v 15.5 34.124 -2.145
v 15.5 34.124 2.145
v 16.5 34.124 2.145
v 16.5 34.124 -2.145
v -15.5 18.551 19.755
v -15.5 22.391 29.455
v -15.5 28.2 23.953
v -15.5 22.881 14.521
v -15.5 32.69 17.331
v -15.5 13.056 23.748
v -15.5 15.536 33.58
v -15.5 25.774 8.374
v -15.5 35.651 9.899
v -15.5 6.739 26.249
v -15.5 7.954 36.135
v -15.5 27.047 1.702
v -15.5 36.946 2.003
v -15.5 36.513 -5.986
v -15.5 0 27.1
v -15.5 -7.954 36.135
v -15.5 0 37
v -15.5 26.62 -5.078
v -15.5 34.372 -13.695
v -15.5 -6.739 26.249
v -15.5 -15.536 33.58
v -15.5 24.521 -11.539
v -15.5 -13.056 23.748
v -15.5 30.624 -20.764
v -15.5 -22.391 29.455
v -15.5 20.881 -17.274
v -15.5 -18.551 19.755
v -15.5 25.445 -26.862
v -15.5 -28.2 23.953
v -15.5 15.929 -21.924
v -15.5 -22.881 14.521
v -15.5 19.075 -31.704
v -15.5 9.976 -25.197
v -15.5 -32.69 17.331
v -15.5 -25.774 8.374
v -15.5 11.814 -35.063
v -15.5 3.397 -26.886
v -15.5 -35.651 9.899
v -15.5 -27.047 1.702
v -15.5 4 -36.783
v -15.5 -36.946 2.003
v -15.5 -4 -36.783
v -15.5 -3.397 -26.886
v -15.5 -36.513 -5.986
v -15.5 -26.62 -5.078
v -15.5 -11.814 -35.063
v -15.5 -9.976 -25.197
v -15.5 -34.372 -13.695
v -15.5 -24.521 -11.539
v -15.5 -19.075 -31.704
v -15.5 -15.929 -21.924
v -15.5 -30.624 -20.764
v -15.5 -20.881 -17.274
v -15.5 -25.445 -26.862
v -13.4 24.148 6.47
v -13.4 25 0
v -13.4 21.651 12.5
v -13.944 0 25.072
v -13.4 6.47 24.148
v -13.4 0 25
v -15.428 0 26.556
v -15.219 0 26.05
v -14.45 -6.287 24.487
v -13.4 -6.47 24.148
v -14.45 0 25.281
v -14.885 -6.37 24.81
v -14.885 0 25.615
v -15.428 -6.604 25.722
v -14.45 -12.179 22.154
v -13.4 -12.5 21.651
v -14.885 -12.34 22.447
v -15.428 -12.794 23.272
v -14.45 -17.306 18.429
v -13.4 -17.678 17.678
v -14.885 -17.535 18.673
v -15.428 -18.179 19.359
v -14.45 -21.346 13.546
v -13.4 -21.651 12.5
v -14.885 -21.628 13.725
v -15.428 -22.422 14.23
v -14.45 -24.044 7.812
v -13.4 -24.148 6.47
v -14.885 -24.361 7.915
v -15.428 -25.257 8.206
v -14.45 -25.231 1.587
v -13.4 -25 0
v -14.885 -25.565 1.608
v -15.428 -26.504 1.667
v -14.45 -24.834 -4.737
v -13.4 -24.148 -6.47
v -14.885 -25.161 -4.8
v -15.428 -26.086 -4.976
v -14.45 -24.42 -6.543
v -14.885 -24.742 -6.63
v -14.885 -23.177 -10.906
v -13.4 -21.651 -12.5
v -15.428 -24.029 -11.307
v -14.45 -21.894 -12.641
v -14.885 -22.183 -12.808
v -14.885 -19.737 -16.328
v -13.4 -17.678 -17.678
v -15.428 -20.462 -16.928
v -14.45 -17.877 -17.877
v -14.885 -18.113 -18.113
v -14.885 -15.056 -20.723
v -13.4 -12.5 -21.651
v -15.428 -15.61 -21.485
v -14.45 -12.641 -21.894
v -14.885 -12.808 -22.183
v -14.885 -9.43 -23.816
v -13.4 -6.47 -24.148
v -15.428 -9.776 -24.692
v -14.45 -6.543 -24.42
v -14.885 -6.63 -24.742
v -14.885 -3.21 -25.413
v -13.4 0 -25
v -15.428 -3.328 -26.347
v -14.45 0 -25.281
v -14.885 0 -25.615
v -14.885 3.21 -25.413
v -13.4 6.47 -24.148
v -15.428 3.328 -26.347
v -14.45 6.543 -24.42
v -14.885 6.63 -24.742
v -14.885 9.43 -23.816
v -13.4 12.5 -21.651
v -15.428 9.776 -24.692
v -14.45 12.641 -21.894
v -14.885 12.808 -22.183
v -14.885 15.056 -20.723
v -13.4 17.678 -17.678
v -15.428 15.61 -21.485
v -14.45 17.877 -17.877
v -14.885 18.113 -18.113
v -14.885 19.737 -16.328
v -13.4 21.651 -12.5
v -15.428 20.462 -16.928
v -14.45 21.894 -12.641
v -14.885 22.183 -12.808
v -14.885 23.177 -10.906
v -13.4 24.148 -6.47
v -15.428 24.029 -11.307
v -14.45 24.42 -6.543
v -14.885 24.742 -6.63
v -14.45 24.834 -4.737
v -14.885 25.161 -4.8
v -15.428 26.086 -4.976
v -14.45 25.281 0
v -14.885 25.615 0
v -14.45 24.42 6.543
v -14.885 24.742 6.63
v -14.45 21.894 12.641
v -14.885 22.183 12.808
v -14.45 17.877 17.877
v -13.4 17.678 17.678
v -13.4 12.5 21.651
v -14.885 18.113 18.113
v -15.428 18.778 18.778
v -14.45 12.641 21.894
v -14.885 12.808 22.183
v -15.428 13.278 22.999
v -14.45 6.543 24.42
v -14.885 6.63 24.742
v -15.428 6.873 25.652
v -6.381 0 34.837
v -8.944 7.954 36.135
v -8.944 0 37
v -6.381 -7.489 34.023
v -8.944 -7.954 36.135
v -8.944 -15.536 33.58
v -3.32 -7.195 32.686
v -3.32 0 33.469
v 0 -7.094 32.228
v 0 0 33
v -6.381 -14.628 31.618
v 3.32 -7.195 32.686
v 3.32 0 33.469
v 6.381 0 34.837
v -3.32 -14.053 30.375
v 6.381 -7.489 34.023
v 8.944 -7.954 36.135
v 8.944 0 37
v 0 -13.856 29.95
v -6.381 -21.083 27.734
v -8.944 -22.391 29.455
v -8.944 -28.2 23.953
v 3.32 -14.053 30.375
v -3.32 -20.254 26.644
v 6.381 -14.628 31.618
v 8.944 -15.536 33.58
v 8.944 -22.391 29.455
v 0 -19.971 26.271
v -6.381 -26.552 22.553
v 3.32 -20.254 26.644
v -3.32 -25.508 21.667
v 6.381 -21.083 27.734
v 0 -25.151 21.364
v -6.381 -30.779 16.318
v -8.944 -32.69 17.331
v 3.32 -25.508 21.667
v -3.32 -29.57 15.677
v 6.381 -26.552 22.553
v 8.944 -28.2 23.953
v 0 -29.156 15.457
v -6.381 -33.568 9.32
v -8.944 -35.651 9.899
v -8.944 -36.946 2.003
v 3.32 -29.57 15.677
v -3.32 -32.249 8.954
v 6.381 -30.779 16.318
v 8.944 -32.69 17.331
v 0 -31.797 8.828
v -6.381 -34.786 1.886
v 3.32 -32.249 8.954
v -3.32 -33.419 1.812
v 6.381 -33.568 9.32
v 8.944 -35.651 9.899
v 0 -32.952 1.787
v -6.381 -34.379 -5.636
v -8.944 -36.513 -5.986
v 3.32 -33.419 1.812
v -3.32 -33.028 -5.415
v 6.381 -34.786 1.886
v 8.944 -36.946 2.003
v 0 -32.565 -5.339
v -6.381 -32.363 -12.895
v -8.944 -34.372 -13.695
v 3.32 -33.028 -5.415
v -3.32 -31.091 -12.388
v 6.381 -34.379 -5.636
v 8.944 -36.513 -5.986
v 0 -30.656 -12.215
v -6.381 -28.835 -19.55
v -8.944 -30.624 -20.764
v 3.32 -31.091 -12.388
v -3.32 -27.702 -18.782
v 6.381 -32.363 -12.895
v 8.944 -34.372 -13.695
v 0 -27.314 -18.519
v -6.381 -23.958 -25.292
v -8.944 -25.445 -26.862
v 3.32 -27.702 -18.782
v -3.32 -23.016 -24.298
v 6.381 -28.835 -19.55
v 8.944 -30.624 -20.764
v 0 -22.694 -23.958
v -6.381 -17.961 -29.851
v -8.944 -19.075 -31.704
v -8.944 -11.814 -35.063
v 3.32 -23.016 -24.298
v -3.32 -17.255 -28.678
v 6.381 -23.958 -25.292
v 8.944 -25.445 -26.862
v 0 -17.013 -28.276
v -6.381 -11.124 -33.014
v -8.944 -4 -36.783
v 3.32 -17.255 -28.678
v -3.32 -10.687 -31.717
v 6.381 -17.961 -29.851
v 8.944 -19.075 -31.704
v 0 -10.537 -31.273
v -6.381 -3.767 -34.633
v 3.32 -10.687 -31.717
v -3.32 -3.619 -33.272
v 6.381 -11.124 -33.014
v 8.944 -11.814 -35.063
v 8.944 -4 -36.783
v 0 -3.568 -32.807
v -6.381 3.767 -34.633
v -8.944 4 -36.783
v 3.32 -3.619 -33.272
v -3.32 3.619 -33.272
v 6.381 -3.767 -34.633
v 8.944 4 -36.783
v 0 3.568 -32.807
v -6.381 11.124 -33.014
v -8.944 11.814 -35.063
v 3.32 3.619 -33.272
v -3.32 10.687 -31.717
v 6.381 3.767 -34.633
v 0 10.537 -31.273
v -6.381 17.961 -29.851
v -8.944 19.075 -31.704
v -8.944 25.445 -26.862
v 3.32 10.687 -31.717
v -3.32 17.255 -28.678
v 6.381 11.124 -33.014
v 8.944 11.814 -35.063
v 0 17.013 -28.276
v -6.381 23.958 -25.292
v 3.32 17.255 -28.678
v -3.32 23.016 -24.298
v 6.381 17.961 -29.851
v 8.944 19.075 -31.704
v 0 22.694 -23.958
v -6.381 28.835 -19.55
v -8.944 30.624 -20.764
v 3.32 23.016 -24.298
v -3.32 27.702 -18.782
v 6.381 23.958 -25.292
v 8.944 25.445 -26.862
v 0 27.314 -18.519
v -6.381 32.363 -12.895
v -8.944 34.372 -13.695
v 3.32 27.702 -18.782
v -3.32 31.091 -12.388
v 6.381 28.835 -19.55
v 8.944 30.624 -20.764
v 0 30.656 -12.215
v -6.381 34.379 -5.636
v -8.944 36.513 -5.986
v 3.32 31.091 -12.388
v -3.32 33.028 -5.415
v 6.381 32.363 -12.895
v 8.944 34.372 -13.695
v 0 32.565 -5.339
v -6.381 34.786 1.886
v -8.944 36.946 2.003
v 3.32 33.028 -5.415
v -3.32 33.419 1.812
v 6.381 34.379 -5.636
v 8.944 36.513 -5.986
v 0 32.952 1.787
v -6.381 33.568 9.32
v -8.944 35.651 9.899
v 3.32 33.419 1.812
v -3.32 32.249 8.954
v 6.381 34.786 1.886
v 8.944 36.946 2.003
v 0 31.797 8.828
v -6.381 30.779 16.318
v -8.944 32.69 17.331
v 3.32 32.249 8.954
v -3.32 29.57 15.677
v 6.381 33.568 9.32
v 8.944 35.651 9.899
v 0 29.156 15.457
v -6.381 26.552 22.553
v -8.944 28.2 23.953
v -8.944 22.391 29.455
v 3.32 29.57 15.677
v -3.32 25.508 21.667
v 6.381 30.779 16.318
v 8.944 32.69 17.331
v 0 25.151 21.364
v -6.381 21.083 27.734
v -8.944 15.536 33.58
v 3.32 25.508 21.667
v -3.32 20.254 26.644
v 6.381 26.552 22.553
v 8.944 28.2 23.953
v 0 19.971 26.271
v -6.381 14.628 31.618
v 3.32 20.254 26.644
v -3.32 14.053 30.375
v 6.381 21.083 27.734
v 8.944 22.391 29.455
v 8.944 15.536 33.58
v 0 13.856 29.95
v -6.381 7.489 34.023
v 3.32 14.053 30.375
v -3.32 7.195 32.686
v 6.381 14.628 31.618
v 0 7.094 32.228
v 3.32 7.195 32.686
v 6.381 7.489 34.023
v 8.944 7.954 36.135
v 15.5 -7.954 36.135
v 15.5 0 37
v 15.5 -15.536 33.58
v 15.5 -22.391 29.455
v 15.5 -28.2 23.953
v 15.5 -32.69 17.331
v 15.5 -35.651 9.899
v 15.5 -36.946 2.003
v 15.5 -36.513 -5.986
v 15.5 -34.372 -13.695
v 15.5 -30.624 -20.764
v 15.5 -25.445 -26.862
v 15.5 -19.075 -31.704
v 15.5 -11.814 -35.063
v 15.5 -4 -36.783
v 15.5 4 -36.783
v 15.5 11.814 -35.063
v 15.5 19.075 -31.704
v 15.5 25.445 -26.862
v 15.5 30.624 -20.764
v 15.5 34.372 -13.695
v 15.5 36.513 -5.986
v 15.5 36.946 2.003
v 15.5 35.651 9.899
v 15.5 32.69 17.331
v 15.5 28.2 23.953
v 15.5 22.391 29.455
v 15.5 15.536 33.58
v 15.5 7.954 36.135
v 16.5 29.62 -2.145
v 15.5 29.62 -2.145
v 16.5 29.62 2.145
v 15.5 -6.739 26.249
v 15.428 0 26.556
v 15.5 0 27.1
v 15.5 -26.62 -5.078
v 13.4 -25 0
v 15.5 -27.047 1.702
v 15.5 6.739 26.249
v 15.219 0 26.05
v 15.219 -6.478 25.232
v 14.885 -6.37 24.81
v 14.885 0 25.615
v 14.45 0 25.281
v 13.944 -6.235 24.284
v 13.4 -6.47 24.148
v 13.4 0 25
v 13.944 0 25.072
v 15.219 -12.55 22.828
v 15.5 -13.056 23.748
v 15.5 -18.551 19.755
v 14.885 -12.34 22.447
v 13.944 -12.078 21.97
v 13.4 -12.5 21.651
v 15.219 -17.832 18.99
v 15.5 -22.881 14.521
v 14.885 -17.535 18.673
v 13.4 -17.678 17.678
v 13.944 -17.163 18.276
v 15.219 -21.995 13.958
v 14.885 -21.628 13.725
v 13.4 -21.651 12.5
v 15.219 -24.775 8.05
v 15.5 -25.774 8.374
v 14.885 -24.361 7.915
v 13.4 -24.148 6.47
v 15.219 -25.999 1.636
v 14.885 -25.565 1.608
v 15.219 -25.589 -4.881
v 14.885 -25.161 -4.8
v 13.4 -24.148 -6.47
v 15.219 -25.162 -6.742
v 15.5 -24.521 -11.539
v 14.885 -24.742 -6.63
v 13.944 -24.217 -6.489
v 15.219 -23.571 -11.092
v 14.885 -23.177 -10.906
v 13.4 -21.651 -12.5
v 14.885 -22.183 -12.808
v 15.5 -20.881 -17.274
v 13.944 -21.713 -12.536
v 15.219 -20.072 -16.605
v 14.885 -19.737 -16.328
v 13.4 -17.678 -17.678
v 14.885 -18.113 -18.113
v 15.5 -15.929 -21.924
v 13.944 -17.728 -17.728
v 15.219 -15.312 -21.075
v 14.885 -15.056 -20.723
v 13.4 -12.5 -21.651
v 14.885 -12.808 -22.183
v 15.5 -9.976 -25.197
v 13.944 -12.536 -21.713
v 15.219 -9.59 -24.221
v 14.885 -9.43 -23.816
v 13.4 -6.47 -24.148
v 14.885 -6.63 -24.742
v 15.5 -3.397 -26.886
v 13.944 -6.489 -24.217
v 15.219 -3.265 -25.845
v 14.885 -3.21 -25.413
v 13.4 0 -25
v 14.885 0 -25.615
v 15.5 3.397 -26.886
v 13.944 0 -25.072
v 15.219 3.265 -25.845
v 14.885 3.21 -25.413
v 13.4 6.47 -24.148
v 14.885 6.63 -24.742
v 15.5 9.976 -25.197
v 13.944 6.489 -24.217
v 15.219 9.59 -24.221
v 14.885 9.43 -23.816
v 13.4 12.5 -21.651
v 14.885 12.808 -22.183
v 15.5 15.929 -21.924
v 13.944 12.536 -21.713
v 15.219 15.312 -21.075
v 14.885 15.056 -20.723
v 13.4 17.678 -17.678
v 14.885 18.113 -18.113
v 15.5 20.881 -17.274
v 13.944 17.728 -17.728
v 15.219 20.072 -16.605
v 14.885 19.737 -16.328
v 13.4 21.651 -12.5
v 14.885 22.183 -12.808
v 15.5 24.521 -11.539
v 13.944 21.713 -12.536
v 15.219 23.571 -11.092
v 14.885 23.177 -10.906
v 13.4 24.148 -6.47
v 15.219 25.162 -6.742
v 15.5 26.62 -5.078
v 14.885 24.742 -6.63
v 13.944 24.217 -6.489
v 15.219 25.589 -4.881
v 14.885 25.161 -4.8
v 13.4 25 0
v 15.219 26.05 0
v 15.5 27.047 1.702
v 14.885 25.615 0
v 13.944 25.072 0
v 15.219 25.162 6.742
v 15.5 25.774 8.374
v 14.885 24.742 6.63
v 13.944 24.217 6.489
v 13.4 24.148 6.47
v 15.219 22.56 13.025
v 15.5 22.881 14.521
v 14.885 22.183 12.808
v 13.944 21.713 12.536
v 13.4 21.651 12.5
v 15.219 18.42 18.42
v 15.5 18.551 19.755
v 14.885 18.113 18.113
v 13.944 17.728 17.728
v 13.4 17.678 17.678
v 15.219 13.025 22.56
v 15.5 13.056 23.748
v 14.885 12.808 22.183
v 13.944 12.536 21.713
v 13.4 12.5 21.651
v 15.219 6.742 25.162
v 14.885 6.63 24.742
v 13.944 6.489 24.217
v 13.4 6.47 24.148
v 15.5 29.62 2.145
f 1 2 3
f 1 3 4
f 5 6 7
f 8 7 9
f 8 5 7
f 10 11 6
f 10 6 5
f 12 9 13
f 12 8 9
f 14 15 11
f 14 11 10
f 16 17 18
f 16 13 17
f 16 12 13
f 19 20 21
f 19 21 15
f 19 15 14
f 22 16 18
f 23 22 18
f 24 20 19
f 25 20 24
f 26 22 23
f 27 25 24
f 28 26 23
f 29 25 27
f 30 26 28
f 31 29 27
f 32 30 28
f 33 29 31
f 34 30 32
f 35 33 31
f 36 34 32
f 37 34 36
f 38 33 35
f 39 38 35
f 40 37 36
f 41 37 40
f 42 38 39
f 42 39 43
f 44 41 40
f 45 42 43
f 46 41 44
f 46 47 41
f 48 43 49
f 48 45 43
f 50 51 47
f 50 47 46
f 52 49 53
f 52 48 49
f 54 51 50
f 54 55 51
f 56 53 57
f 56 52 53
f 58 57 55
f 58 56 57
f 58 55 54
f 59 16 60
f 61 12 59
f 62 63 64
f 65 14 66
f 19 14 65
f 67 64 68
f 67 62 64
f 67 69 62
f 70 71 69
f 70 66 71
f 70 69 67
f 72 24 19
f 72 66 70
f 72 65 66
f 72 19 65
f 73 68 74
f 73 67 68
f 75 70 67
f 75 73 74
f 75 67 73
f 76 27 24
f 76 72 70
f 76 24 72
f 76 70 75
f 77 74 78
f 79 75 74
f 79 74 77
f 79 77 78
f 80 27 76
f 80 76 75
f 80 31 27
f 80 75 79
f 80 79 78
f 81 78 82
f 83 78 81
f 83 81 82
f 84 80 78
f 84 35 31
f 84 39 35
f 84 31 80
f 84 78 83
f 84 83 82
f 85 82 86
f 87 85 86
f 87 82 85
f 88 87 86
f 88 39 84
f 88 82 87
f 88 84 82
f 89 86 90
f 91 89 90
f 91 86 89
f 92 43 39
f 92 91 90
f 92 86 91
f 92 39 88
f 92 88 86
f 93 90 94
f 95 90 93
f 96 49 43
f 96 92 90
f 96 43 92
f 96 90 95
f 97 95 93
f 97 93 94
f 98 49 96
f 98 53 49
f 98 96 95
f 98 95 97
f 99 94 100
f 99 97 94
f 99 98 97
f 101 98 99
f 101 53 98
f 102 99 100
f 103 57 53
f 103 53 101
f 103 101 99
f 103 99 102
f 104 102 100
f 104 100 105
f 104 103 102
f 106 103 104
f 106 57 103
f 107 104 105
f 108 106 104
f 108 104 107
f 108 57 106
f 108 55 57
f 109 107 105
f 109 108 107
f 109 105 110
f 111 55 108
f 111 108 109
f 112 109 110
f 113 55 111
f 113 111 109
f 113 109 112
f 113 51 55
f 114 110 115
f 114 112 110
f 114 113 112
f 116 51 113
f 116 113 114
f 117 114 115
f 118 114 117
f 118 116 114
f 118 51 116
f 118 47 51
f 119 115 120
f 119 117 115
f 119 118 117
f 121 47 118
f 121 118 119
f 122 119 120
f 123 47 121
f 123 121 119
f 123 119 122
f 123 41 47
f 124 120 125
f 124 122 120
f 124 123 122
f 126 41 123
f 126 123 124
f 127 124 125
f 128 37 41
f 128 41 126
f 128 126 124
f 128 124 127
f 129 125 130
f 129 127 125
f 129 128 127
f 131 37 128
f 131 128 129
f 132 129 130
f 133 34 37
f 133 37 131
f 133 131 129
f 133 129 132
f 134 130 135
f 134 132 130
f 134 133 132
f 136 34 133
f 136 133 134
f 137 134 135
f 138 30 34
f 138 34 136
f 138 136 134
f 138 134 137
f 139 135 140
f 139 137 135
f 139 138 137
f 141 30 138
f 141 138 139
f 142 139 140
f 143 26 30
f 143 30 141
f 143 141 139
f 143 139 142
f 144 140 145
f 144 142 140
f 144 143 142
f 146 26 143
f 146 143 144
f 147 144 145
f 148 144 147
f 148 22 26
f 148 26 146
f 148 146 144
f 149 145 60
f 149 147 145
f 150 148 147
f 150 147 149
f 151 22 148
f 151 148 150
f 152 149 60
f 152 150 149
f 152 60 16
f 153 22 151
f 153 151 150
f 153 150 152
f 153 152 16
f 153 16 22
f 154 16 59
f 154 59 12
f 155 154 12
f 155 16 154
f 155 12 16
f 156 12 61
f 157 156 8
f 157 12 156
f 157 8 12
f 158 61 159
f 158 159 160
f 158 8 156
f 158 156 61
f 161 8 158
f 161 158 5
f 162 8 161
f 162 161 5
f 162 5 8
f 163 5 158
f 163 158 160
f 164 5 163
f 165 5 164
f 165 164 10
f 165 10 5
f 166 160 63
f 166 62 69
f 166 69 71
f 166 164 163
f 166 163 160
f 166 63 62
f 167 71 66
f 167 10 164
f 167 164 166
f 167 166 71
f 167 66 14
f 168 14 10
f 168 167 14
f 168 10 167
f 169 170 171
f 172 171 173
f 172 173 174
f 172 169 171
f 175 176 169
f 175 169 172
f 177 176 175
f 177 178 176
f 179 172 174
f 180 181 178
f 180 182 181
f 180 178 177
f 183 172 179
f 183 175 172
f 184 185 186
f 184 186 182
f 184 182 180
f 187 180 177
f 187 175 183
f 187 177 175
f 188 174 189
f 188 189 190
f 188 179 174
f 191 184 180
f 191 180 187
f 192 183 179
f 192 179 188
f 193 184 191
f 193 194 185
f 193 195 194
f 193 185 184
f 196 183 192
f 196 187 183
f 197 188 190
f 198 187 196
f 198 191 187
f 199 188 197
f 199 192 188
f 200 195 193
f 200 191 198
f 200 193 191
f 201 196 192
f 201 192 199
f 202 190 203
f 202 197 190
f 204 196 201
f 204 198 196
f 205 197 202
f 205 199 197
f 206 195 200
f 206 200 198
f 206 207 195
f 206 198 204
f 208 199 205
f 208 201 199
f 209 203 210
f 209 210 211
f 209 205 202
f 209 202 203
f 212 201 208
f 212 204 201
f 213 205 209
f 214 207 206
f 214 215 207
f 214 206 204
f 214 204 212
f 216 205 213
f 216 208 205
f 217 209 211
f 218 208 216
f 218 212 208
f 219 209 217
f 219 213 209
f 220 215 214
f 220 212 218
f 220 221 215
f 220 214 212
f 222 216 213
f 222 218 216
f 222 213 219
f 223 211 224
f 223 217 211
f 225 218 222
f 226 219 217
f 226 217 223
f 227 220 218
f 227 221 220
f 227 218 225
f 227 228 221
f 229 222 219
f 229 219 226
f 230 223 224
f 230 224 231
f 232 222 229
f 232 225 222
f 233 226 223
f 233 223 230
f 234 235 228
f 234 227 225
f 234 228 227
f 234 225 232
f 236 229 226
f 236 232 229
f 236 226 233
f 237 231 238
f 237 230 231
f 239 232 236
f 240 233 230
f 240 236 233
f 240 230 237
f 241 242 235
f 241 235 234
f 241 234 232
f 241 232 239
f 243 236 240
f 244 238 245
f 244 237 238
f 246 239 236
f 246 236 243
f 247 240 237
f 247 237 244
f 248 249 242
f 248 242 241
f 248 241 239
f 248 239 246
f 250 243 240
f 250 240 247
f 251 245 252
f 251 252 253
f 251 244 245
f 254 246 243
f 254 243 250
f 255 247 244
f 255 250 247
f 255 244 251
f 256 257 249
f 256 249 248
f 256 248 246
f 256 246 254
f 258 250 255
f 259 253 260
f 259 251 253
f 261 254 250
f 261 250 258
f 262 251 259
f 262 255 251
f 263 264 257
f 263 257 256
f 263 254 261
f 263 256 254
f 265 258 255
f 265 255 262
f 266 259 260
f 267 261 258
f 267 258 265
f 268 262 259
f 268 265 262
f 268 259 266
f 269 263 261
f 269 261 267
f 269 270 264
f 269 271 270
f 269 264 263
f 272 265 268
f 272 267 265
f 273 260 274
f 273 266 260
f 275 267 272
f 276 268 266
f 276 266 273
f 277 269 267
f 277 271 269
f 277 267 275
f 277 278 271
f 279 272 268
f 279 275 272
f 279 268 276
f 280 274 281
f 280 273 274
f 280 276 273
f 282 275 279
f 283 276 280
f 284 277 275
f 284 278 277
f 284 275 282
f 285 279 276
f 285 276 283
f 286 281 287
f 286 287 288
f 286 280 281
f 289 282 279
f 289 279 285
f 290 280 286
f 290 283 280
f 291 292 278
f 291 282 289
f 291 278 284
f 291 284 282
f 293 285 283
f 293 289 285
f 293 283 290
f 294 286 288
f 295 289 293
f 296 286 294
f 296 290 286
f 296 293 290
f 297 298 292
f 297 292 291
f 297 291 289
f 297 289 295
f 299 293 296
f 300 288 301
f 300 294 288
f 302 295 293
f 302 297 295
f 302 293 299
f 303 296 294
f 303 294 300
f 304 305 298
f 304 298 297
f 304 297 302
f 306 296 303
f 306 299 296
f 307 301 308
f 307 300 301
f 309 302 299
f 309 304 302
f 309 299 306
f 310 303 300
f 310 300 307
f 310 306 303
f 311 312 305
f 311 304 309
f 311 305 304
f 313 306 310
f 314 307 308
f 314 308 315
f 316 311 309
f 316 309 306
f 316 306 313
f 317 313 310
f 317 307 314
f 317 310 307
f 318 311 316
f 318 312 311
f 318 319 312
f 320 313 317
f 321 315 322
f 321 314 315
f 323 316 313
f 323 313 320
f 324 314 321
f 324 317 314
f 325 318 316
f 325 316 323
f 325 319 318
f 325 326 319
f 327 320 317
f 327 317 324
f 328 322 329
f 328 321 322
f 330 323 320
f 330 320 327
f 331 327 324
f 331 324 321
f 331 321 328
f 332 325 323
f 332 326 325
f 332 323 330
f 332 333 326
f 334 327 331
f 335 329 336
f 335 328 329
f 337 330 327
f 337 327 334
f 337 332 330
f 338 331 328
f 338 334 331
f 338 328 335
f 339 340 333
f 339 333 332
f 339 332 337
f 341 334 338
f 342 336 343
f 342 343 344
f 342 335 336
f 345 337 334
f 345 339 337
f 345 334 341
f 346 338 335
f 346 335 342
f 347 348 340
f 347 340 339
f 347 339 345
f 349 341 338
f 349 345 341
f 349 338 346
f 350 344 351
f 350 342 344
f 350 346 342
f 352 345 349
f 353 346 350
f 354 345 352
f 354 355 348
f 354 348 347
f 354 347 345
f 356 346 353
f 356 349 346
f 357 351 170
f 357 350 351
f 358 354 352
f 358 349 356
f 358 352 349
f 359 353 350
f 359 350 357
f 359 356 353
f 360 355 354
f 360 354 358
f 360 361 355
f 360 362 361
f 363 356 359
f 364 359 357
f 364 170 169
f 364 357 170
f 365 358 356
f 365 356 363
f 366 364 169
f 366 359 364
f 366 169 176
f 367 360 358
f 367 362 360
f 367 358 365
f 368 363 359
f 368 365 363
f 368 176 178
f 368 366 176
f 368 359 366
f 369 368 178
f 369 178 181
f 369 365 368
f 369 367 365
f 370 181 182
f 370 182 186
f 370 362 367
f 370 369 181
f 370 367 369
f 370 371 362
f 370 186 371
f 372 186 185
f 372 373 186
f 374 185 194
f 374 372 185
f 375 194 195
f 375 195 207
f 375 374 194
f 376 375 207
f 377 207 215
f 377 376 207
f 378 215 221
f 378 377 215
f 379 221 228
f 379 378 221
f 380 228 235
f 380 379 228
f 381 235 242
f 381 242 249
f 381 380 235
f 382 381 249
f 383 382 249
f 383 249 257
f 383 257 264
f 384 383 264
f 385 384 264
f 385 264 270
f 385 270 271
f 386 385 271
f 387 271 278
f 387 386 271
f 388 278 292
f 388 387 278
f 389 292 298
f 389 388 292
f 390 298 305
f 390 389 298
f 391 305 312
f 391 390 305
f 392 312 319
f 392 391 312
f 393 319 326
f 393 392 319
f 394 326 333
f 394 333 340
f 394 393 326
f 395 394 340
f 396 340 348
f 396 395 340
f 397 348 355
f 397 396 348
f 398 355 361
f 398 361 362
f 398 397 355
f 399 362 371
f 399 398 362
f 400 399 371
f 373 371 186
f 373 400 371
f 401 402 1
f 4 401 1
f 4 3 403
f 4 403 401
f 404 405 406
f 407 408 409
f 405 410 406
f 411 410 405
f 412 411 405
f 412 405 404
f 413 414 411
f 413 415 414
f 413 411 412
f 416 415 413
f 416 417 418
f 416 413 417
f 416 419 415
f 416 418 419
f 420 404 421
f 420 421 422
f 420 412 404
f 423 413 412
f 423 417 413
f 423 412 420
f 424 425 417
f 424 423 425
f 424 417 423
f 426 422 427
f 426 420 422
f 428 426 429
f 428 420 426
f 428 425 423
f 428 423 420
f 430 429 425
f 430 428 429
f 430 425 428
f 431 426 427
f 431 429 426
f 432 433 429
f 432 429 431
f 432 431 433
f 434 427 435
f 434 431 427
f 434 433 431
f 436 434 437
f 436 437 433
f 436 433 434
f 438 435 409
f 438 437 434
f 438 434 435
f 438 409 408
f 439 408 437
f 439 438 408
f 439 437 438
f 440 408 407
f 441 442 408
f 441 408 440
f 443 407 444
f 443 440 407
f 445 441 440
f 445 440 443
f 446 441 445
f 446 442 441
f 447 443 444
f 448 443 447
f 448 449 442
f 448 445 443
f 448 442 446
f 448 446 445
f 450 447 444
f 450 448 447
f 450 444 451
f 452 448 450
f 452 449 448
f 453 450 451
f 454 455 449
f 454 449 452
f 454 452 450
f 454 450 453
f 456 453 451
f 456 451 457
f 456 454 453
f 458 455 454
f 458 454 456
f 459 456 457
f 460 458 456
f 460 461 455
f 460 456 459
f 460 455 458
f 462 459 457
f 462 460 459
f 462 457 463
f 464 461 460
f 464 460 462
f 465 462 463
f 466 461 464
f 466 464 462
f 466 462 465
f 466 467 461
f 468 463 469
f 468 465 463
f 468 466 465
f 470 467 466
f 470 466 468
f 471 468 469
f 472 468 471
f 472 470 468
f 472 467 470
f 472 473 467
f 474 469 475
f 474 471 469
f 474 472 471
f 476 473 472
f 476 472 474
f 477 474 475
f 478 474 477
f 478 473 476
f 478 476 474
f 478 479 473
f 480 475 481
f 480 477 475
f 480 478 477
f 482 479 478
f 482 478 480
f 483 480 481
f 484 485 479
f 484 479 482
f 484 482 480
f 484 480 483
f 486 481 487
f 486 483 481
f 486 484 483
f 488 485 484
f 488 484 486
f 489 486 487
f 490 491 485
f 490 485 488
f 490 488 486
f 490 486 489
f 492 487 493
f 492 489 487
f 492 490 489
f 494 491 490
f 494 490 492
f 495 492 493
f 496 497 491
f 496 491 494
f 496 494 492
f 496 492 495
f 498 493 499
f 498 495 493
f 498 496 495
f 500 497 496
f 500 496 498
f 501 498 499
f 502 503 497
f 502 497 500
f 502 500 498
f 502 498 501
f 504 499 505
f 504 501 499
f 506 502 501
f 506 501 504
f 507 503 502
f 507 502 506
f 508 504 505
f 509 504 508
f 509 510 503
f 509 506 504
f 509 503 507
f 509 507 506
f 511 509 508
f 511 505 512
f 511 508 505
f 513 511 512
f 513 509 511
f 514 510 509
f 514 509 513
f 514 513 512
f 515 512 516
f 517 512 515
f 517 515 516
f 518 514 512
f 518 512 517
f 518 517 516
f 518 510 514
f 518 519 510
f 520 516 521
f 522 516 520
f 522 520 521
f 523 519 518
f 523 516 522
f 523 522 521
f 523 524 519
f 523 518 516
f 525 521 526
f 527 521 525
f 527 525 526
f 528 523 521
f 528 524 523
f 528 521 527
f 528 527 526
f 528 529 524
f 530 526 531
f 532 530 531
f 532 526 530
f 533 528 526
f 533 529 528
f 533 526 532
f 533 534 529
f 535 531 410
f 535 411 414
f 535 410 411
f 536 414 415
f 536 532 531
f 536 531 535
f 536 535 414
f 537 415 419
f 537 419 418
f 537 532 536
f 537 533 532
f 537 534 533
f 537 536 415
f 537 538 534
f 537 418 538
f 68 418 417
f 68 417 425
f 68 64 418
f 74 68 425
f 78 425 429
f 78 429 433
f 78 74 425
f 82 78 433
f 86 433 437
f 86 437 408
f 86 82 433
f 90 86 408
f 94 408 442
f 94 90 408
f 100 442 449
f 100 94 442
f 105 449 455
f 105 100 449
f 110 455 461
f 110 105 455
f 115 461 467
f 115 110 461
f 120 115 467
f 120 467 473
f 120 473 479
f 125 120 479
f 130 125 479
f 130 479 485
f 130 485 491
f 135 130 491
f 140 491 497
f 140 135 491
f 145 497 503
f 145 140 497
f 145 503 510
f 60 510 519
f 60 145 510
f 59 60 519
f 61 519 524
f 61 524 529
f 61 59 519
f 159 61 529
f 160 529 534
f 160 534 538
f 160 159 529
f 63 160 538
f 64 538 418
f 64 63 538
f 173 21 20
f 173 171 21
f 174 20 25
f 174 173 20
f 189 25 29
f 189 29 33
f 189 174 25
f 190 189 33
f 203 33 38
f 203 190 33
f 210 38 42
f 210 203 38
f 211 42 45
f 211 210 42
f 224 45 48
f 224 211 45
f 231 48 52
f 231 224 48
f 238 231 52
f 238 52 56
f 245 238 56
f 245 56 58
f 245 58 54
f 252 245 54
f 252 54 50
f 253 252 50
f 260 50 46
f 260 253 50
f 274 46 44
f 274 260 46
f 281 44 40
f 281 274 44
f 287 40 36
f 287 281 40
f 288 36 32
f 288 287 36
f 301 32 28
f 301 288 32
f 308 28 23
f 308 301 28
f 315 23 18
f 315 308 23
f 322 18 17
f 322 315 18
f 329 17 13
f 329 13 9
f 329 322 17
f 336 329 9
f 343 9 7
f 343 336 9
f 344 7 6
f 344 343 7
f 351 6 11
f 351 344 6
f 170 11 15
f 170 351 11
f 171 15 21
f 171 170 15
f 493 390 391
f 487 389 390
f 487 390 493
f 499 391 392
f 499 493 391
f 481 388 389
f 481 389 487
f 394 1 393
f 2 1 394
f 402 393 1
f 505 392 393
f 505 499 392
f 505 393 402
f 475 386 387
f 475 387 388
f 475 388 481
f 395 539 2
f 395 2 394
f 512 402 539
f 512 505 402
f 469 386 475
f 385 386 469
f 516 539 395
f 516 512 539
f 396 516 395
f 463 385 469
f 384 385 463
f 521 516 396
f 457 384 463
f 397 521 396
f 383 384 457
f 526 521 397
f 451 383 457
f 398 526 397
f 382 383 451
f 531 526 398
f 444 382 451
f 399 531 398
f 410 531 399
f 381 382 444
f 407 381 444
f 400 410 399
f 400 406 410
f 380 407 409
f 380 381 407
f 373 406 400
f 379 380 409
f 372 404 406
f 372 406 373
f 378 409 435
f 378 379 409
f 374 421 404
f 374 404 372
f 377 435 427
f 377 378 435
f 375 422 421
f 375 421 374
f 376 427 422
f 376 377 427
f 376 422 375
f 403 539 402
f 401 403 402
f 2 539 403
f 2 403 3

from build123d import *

# Parameters (mm, degrees)
SKETCH2_W           = 4.289378808
SKETCH2_H           = 4.50384775
BOSS_EXTRUDE1_DEPTH = 1


with BuildPart() as part:
    # Sketch1 → Revolve2 (revolve)
    with BuildSketch(Plane.XY, mode=Mode.PRIVATE) as revolve2_sk:
        with BuildLine():
            Line((-15.5, 37), (-8.94427191, 37))
            ThreePointArc((-8.94427191, 37), (0, 33), (8.94427191, 37))
            Line((8.94427191, 37), (15.5, 37))
            Line((15.5, 37), (15.5, 27.1))
            ThreePointArc((15.5, 27.1), (14.88492424, 25.61507576), (13.4, 25))
            Line((13.4, 25), (-13.4, 25))
            ThreePointArc((-13.4, 25), (-14.88492424, 25.61507576), (-15.5, 27.1))
            Line((-15.5, 27.1), (-15.5, 37))
        make_face()
    revolve(revolve2_sk.sketch.rotate(Axis((-15.146387833, 0, 0), (1, 0, 0)), 90), axis=Axis((-15.146387833, 0, 0), (1, 0, 0)))

    # Sketch2 → Boss-Extrude1 (add)
    with BuildSketch(Plane(origin=(15.5, 0, 0), x_dir=(0, 0, -1), z_dir=(1, 0, 0))):
        with Locations((0, 31.871583754)):
            Rectangle(SKETCH2_W, SKETCH2_H)
    extrude(amount=BOSS_EXTRUDE1_DEPTH)


solid = part.part
